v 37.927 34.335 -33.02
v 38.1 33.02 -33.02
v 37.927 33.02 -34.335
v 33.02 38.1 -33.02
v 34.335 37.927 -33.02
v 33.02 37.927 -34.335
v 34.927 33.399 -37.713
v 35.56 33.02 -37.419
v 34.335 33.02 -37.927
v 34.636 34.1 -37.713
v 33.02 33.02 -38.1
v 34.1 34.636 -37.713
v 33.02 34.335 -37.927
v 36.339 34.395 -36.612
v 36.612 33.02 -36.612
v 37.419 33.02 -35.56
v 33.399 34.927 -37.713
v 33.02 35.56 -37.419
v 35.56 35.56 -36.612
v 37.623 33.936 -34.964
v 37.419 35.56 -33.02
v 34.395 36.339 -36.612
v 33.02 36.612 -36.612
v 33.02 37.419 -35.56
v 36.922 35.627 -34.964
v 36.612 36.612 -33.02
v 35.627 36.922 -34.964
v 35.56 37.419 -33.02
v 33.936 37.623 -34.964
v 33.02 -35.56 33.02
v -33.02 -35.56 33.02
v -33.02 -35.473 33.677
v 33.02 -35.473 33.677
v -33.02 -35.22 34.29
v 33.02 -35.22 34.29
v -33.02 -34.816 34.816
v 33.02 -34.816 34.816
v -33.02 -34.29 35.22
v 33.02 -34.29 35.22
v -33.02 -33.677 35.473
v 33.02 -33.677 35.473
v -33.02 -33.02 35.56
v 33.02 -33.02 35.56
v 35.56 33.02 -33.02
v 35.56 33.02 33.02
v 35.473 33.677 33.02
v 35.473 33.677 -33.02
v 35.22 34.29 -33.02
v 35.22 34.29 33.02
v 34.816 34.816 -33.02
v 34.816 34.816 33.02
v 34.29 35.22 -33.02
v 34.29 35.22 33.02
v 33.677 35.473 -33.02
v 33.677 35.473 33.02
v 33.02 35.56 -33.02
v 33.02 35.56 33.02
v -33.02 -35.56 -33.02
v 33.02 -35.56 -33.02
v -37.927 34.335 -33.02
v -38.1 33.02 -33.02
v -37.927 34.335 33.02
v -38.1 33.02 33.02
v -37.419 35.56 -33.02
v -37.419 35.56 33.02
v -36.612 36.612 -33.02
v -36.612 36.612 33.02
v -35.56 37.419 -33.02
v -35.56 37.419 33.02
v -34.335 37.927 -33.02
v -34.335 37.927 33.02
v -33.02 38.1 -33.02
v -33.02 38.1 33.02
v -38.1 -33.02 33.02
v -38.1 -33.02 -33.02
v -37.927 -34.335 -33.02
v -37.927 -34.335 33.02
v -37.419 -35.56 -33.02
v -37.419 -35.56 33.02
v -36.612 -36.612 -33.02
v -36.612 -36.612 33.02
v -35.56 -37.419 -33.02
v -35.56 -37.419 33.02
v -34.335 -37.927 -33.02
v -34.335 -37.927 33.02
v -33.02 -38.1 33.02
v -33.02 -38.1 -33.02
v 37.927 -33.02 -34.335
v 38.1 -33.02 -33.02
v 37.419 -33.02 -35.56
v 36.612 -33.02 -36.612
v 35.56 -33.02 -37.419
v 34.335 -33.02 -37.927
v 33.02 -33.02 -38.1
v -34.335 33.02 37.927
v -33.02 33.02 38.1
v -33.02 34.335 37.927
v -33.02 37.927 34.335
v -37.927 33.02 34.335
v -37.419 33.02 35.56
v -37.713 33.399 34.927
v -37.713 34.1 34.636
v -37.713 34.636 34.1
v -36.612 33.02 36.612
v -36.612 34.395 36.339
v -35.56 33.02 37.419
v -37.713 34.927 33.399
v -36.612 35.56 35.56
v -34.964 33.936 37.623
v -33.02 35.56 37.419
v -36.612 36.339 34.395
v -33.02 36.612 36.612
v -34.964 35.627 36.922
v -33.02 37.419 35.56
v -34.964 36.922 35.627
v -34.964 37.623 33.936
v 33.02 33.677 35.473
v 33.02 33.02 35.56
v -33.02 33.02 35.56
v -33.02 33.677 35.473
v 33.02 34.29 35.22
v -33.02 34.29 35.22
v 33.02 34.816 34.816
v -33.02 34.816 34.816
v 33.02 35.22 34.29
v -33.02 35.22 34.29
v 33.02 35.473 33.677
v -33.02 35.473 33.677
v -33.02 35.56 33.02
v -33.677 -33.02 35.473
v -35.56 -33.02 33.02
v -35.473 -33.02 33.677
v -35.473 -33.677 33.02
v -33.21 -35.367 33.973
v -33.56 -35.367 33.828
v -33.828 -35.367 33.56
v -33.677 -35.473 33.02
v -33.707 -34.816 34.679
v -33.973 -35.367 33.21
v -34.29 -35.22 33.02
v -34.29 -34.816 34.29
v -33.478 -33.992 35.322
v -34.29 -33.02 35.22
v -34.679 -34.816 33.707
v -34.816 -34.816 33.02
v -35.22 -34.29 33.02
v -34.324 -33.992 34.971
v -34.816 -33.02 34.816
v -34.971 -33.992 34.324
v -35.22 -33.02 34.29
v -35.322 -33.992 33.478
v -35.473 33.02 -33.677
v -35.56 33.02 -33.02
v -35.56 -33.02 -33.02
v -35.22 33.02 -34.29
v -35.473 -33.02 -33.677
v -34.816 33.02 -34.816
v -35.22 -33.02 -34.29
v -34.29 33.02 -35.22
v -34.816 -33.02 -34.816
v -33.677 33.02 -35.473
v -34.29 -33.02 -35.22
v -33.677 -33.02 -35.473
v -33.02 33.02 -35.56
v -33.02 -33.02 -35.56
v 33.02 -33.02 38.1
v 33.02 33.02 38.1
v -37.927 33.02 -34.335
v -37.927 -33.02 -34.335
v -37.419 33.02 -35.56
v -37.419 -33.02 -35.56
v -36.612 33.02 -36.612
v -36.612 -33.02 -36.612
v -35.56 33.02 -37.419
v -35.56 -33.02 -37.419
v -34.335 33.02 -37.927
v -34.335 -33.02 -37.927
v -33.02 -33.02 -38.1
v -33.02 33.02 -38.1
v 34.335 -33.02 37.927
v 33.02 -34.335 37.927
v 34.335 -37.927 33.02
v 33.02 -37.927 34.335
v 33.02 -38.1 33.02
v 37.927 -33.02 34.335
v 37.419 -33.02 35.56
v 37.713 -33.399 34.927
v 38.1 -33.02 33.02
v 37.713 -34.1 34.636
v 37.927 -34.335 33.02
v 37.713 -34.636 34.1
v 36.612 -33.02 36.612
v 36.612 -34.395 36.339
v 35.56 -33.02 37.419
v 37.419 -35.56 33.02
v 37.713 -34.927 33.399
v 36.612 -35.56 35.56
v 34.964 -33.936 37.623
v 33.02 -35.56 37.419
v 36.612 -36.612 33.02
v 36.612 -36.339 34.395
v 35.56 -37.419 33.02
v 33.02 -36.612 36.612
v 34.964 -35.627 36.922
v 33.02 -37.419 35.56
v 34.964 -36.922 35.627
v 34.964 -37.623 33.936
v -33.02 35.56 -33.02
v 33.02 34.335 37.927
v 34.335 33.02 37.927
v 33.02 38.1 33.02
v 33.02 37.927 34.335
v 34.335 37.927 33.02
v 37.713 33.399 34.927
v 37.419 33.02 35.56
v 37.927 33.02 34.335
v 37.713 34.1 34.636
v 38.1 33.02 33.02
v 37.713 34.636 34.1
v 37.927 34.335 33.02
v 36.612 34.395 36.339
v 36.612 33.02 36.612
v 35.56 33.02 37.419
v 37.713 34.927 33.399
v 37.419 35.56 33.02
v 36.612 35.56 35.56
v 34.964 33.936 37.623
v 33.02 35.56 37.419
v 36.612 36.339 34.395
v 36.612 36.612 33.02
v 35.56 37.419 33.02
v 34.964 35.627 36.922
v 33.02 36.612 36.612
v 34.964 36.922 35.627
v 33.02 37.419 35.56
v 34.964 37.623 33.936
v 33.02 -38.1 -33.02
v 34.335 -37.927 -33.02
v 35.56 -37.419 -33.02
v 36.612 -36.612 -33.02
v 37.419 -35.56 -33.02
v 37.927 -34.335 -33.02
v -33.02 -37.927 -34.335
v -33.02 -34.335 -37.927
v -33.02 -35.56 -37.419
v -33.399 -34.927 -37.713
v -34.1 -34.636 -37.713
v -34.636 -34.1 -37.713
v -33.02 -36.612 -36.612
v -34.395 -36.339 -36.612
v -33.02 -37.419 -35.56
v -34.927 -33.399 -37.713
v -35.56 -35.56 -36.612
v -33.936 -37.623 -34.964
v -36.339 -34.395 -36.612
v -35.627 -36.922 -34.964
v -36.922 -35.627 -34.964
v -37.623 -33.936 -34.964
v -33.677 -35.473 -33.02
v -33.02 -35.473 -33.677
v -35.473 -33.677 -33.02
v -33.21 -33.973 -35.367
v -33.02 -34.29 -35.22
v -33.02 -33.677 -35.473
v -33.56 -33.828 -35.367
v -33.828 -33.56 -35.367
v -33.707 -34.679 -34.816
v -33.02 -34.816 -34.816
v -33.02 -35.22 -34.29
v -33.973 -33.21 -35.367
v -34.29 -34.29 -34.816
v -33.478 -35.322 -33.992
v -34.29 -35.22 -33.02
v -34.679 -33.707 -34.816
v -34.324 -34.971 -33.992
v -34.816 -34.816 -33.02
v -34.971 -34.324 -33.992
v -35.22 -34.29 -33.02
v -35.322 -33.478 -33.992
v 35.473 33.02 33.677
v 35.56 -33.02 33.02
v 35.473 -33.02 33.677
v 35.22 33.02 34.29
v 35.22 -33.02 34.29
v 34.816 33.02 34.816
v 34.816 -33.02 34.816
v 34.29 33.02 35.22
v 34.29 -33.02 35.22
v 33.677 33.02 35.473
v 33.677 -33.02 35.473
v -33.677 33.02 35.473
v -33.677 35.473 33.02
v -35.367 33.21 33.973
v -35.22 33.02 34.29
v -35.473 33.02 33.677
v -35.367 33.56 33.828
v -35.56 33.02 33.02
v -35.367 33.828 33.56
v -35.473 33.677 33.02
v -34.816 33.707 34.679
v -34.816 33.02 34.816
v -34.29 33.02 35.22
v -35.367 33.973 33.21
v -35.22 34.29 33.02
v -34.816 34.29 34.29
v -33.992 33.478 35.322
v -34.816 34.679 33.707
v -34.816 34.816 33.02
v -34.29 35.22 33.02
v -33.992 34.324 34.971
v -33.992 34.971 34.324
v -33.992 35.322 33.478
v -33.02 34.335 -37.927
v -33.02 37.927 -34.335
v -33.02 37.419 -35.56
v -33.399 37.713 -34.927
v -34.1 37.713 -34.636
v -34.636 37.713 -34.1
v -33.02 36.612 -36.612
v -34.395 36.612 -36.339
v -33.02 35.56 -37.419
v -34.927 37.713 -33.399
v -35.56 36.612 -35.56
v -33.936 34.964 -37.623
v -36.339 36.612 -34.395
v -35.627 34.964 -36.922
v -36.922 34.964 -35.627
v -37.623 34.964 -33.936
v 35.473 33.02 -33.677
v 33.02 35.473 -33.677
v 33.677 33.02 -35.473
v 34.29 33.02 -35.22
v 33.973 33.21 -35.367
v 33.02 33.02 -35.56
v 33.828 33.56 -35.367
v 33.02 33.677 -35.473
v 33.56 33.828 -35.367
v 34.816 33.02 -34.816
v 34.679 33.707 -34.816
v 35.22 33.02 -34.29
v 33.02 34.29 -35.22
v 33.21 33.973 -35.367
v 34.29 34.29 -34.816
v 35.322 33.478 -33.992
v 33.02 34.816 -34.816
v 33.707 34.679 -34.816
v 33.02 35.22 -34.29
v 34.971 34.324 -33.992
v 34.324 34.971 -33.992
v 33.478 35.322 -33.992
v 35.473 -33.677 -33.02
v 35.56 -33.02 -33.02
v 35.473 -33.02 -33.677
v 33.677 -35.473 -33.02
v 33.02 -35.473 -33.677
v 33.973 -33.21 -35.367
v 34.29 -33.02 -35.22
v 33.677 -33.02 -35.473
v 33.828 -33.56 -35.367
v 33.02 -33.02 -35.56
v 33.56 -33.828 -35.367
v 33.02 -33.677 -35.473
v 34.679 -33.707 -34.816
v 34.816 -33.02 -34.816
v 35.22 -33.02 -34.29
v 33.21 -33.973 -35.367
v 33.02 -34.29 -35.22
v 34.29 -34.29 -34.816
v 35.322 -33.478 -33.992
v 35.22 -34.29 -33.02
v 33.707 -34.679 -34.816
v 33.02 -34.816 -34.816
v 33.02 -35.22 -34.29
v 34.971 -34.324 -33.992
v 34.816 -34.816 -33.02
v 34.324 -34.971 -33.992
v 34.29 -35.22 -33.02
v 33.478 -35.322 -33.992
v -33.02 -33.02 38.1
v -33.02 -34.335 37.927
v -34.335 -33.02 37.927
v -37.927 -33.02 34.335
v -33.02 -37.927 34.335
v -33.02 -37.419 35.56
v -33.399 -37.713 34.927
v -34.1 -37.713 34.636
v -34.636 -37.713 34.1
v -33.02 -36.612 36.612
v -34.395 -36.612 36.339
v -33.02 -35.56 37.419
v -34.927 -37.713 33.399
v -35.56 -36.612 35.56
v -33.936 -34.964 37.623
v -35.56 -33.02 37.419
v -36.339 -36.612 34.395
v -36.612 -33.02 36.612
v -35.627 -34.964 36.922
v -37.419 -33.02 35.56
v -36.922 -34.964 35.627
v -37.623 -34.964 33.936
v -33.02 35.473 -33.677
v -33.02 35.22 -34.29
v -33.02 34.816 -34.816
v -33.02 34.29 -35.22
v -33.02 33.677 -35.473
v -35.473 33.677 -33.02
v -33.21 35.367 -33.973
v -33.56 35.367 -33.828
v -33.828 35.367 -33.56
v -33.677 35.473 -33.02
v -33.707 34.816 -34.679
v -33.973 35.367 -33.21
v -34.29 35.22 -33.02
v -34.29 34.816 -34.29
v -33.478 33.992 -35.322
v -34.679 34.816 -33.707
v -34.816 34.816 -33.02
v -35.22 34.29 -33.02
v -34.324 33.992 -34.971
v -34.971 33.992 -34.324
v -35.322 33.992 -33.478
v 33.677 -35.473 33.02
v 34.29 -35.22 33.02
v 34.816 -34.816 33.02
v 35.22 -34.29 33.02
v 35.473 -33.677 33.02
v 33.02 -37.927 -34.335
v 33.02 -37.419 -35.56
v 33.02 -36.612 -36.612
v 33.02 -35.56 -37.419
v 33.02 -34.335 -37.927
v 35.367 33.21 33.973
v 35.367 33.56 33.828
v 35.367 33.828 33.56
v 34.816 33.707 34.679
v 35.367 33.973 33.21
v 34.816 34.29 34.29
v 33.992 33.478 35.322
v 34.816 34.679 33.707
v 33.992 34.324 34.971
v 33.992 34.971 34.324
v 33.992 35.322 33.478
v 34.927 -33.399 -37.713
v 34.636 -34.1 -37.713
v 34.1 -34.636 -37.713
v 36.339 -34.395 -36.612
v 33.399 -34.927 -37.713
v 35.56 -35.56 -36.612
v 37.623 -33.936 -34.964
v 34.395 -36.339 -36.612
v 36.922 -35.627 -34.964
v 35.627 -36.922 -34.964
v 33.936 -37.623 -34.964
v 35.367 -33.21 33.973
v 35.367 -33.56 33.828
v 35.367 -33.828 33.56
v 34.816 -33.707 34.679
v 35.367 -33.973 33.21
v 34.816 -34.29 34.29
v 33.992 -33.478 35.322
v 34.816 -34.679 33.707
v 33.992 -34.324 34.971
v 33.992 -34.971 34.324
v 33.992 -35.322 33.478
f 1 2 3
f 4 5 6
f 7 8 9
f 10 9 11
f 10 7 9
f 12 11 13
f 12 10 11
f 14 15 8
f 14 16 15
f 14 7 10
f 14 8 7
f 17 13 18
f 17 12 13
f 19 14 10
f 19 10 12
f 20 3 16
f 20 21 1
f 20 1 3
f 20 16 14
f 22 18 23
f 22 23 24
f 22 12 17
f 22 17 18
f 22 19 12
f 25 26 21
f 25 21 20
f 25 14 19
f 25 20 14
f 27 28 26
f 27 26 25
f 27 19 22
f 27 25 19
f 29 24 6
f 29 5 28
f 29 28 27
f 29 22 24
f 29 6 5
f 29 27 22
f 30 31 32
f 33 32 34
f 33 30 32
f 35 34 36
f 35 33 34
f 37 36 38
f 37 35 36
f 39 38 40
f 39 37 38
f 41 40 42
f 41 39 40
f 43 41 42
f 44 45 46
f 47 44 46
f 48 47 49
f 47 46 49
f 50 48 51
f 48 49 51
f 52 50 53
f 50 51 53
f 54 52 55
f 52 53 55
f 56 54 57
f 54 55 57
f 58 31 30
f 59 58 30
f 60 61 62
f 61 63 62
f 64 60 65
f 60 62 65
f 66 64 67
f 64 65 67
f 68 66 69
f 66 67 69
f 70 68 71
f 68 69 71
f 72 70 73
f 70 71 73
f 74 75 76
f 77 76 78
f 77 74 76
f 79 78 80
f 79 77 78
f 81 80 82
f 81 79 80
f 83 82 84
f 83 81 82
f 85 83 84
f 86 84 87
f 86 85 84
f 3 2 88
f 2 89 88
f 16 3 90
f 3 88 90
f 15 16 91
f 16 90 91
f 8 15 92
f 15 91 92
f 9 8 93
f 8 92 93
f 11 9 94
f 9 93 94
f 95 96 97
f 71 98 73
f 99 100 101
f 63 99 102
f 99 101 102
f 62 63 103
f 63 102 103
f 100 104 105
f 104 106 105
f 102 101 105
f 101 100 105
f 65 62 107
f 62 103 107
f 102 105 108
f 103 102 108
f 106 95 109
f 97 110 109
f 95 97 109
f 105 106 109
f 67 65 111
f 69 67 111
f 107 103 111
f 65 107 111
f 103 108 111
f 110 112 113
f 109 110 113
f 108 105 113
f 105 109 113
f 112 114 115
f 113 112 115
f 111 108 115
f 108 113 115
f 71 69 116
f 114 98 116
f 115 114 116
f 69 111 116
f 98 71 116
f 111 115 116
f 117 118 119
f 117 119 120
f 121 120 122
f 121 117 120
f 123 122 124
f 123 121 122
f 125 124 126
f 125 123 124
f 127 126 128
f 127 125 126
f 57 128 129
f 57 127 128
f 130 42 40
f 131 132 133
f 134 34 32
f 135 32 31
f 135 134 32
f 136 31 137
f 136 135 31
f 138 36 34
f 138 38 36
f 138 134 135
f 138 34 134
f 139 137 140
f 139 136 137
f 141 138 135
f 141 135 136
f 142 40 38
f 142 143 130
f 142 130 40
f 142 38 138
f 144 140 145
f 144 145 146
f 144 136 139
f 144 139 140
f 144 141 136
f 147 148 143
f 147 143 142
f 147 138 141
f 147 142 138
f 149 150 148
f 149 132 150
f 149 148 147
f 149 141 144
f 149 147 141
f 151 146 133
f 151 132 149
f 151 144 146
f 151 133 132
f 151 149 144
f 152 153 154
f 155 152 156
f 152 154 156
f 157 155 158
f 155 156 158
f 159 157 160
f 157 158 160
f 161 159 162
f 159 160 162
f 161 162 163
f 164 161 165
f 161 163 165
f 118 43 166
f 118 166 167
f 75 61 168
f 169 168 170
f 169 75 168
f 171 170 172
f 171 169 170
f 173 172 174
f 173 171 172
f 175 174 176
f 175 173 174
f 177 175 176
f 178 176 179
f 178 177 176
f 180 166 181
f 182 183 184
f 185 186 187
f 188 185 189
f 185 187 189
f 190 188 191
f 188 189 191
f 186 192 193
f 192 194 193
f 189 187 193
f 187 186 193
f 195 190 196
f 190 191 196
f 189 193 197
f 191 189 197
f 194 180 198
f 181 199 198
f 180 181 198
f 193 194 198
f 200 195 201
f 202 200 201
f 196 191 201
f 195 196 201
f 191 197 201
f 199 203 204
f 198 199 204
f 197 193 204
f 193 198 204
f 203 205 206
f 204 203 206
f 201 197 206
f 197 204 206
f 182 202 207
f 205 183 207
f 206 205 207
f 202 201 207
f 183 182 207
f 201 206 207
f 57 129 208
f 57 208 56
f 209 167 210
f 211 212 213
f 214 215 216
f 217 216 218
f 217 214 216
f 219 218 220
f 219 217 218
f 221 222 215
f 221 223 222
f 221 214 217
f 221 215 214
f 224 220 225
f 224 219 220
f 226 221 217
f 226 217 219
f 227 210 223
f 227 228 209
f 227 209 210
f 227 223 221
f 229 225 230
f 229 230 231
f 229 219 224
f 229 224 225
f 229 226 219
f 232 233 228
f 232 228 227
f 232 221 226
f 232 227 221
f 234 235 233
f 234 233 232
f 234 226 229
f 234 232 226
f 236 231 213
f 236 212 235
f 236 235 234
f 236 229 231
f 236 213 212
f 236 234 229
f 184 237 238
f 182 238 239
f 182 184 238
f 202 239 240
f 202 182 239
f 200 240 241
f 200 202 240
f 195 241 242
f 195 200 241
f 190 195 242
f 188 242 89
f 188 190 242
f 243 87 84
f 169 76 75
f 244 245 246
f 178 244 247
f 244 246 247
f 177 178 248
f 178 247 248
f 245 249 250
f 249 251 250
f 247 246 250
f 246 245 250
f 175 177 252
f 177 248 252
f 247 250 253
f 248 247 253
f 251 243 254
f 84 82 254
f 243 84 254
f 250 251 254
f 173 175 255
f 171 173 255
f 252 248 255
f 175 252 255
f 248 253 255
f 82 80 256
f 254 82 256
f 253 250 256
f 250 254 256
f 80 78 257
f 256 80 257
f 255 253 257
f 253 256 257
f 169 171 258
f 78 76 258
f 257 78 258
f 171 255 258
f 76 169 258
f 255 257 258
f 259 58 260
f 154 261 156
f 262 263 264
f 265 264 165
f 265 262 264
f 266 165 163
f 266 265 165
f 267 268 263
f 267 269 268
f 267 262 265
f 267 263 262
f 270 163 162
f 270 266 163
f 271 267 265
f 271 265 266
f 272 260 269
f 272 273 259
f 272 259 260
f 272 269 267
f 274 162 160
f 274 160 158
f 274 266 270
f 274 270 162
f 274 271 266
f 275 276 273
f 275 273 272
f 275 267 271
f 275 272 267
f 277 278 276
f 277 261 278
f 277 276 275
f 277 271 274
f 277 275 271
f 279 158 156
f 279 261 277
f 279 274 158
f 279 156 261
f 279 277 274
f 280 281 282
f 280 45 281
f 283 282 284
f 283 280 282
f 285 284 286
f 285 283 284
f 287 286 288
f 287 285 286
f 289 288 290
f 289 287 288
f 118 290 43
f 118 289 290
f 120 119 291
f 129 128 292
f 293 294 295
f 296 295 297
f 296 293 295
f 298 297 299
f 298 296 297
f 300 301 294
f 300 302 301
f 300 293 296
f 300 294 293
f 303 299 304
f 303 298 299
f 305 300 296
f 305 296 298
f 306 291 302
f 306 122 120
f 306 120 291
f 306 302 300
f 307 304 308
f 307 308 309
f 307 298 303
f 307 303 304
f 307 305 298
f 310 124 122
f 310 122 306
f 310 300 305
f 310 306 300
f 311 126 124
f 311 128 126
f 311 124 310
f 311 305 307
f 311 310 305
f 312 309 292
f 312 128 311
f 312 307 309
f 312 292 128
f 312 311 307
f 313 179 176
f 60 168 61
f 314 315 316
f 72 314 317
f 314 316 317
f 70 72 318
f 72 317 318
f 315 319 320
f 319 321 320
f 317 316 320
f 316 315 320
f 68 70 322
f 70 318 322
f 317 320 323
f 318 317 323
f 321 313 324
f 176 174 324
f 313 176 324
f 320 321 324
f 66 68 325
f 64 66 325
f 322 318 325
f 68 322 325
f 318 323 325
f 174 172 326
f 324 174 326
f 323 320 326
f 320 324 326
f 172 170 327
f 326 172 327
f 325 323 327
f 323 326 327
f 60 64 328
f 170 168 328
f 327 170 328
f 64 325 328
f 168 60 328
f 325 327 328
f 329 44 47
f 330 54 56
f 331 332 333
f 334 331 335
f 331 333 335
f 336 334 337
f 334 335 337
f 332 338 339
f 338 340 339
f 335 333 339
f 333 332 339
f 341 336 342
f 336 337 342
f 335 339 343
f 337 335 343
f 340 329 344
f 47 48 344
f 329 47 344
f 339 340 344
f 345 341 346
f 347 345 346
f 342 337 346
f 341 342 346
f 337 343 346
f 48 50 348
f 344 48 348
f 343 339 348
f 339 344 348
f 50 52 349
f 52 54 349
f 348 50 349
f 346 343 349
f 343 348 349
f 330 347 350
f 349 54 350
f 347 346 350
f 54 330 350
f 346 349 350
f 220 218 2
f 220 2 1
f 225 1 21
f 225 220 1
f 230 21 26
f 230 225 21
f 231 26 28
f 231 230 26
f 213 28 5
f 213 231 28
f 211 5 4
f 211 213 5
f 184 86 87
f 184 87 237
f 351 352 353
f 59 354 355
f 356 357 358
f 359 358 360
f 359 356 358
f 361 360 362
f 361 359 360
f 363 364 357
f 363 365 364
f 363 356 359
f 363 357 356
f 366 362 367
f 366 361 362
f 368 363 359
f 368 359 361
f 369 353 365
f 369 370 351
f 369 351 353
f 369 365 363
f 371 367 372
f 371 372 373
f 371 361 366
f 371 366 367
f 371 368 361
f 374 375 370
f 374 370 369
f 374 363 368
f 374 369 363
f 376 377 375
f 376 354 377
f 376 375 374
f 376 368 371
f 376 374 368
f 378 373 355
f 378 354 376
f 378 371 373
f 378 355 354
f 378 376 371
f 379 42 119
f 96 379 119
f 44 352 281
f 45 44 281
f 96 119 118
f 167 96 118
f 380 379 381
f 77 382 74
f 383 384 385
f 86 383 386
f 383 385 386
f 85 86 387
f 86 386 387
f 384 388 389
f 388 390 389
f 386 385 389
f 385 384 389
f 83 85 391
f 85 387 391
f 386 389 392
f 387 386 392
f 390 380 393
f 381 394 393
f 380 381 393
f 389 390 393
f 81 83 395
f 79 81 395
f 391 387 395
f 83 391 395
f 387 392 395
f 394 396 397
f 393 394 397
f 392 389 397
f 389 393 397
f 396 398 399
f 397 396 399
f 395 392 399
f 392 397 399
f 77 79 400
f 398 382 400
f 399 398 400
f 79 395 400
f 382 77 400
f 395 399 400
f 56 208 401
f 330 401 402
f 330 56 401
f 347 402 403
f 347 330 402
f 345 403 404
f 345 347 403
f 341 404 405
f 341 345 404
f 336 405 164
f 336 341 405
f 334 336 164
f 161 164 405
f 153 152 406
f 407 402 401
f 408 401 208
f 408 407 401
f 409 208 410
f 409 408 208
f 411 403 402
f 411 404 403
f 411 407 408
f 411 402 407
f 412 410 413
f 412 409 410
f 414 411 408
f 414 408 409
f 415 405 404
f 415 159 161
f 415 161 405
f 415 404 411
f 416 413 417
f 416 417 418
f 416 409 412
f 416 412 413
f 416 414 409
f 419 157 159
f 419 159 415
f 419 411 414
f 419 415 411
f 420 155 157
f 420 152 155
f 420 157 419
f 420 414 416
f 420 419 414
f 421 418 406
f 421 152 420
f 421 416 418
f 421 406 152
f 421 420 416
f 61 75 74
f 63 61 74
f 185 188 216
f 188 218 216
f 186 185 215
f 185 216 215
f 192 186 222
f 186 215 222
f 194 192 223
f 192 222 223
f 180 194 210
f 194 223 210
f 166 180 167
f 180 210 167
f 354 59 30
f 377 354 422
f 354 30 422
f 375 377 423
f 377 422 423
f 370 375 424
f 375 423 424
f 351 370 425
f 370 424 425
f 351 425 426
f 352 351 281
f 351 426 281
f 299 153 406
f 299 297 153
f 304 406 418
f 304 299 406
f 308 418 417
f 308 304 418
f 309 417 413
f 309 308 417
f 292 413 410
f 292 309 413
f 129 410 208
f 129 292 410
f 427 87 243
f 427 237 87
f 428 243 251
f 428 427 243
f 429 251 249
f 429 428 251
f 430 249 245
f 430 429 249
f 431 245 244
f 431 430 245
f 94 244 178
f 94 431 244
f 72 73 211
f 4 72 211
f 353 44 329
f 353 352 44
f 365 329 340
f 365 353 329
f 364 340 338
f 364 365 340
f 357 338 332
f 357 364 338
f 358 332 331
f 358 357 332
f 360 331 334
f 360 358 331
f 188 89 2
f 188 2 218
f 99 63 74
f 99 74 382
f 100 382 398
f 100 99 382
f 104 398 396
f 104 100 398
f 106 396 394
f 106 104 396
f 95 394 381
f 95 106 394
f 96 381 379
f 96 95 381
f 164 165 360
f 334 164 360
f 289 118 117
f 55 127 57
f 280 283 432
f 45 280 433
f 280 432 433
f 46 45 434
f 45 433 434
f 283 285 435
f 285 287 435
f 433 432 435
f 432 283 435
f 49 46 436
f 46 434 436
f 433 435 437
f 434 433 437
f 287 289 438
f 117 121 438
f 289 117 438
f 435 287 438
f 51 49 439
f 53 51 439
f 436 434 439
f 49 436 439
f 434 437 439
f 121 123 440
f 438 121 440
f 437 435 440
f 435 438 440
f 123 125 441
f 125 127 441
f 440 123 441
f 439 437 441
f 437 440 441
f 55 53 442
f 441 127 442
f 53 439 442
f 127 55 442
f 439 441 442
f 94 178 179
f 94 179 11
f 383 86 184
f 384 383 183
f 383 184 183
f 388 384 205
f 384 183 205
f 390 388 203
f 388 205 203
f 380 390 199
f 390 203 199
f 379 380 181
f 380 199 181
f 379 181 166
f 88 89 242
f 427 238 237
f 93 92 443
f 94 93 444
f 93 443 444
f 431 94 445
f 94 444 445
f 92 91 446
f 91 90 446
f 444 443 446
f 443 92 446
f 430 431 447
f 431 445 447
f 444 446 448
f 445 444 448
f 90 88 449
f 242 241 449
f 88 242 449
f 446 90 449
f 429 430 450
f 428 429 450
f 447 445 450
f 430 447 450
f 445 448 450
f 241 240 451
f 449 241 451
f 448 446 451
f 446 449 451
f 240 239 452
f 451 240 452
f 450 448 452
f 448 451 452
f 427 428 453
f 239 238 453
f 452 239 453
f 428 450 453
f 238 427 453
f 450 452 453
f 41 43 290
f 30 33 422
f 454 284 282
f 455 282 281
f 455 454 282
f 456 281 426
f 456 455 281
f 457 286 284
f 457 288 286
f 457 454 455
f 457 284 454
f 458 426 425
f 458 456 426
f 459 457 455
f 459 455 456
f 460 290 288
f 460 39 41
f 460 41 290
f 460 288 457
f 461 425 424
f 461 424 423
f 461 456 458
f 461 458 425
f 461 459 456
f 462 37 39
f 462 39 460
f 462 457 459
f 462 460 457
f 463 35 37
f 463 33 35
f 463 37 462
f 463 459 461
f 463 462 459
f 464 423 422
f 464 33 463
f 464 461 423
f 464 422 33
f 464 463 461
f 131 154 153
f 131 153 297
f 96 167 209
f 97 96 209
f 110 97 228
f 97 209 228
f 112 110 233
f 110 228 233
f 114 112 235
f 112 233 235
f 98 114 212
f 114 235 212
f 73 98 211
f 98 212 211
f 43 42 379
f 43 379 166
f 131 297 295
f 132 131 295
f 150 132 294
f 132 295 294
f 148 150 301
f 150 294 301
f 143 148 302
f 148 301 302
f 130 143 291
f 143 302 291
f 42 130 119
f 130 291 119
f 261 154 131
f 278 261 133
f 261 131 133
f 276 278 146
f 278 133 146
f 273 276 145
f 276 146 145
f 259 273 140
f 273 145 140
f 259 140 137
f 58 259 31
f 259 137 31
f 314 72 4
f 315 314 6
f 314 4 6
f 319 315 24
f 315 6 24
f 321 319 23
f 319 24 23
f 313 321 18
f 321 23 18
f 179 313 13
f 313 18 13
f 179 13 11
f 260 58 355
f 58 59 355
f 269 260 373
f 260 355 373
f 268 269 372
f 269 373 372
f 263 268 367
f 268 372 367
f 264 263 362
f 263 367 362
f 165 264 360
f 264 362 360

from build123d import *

# Parameters (mm, degrees)
F0_W     = 76.2
F0_H     = 76.2
F1_DEPTH = 38.1
F2_R     = 5.08
F3_T     = -2.54


# Not quite as in the source:
# - a shell that OpenCascade refuses in one call is made with other operations: the cavity is built on its own and cut out


with BuildPart() as f1:
    # F0 (on Front) → F1 (new body, symmetric)
    with BuildSketch(Plane.XZ):
        Rectangle(F0_W, F0_H)
    extrude(amount=F1_DEPTH, both=True)

    # F2
    f2_edges = [f1.edges().sort_by_distance(p)[0] for p in [
        (0, 38.1, 38.1),
        (-38.1, 0, 38.1),
        (0, -38.1, 38.1),
        (38.1, 0, 38.1),
        (38.1, 38.1, 0),
        (38.1, -38.1, 0),
        (38.1, 0, -38.1),
        (-38.1, -38.1, 0),
        (0, -38.1, -38.1),
        (-38.1, 0, -38.1),
        (0, 38.1, -38.1),
        (-38.1, 38.1, 0),
    ]]
    fillet(f2_edges, radius=F2_R)

    # F3: a shell. OpenCascade refuses it in one call, so the cavity is built on its own and cut out:
    # the body offset inwards by the wall thickness, plus a prism from it out through each open face.
    f3_core = offset(f1.part, amount=F3_T, mode=Mode.PRIVATE)
    f3_exits = [f3_core.faces().sort_by_distance(p)[0] for p in [
        (0, 0, 35.56),
    ]]
    add(f3_core, mode=Mode.SUBTRACT)
    extrude(f3_exits, amount=-F3_T, mode=Mode.SUBTRACT)


solid = f1.part
